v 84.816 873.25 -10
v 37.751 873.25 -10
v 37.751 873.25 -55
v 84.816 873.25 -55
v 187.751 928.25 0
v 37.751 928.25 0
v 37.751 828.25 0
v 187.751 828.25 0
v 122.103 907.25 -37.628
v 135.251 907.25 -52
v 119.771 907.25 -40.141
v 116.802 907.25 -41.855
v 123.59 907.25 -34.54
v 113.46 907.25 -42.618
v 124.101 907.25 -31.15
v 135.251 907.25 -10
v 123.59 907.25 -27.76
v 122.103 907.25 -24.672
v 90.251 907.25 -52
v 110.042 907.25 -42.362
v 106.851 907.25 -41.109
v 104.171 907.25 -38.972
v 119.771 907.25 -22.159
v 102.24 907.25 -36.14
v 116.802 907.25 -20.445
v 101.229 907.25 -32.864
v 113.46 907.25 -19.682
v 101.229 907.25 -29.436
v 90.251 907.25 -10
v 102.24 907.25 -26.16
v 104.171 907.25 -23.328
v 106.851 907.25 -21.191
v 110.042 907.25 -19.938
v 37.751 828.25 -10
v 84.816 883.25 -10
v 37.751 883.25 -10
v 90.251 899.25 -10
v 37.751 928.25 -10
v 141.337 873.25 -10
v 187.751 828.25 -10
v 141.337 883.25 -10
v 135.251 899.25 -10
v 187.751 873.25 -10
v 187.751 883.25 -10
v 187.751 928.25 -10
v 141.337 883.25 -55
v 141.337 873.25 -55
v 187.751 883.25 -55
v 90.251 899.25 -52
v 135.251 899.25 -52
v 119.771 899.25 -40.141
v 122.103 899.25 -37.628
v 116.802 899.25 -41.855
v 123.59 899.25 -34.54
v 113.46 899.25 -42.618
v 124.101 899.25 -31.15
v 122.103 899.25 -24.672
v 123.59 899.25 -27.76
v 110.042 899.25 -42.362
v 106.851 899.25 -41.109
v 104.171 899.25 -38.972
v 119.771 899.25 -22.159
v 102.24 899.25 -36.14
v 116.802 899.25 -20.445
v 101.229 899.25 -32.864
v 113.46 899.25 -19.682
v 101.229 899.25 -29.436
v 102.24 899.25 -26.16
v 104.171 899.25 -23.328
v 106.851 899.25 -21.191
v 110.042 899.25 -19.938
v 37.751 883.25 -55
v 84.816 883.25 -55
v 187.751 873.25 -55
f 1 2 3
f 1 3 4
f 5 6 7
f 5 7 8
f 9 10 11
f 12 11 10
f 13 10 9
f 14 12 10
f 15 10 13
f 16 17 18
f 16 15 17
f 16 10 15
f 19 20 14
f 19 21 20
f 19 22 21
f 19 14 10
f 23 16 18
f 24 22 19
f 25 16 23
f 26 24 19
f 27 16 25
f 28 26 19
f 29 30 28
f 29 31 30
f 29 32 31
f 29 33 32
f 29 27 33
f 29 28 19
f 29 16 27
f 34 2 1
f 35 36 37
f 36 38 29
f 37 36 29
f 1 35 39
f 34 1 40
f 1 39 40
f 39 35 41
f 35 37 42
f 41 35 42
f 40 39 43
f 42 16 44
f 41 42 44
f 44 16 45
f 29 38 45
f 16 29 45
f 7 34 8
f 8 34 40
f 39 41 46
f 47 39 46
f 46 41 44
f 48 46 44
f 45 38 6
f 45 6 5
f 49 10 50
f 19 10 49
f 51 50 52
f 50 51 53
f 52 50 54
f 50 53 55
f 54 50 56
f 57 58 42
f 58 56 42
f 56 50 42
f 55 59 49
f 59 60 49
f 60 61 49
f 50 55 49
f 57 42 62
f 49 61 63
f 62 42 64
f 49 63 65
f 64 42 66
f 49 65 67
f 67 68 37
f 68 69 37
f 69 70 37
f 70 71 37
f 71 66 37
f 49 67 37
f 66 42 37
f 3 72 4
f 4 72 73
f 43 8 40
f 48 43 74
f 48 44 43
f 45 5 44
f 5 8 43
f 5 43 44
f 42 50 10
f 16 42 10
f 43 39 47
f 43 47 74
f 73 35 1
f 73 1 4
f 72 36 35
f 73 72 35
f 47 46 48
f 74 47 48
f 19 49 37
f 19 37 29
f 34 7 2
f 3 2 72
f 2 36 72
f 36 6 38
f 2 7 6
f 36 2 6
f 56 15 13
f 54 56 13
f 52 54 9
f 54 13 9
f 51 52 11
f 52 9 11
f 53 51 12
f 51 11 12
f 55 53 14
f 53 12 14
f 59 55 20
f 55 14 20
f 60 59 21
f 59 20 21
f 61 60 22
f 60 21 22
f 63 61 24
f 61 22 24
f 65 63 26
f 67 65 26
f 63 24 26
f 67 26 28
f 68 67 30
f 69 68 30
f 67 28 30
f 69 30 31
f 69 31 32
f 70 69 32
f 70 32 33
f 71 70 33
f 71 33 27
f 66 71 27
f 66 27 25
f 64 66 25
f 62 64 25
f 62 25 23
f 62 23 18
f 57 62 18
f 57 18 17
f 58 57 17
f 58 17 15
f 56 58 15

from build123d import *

# Parameters (mm, degrees)
SKETCH1_W                = 150
SKETCH1_H                = 10
BOSS_EXTRUDE1_DEPTH      = 55
SKETCH2_W                = 150
SKETCH2_H                = 10
BOSS_EXTRUDE2_DEPTH      = 45
BOSS_EXTRUDE2_DEPTH_BACK = 55
SKETCH3_W                = 45
SKETCH3_H                = 8
BOSS_EXTRUDE3_DEPTH      = 42
SKETCH4_W                = 56.520568853
SKETCH4_H                = 45
CUT_EXTRUDE1_DEPTH       = 56
SKETCH5_R                = 11.5
CUT_EXTRUDE2_DEPTH       = 80


with BuildPart() as part:
    # Sketch1 → Boss-Extrude1 (new body)
    with BuildSketch(Plane.XY):
        with Locations((112.750906932, 878.250348045)):
            Rectangle(SKETCH1_W, SKETCH1_H)
    extrude(amount=-BOSS_EXTRUDE1_DEPTH)

    # Sketch2 → Boss-Extrude2 (add, two sides)
    with BuildSketch(Plane(origin=(0, 883.250348045, 0), x_dir=(1, 0, 0), z_dir=(0, 1, 0))) as boss_extrude2_sk:
        with Locations((112.750906932, 5)):
            Rectangle(SKETCH2_W, SKETCH2_H)
    extrude(amount=BOSS_EXTRUDE2_DEPTH)
    extrude(boss_extrude2_sk.sketch, amount=-BOSS_EXTRUDE2_DEPTH_BACK)

    # Sketch3 → Boss-Extrude3 (add)
    with BuildSketch(Plane(origin=(0, 0, -10), x_dir=(-1, 0, 0), z_dir=(0, 0, -1))):
        with Locations((-112.750906932, 903.250348045)):
            Rectangle(SKETCH3_W, SKETCH3_H)
    extrude(amount=BOSS_EXTRUDE3_DEPTH)

    # Sketch4 → Cut-Extrude1 (cut, through all)
    with BuildSketch(Plane(origin=(0, 883.250348045, 0), x_dir=(1, 0, 0), z_dir=(0, 1, 0))):
        with Locations((113.076467001, 32.5)):
            Rectangle(SKETCH4_W, SKETCH4_H)
    extrude(amount=-CUT_EXTRUDE1_DEPTH, mode=Mode.SUBTRACT)

    # Sketch5 → Cut-Extrude2 (cut, through all)
    with BuildSketch(Plane(origin=(0, 907.250348045, 0), x_dir=(1, 0, 0), z_dir=(0, 1, 0))):
        with Locations((112.600906932, 31.15)):
            Circle(SKETCH5_R)
    extrude(amount=-CUT_EXTRUDE2_DEPTH, mode=Mode.SUBTRACT)


solid = part.part
